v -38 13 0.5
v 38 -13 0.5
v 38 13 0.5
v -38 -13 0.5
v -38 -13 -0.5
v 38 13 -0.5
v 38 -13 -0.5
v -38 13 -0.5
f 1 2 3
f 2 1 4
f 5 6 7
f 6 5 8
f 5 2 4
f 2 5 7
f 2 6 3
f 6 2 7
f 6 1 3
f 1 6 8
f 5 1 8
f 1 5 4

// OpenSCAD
// file: libs/microscope-slide-hyperobject/slide.scad
// ----------------------------------------------------
// Material Hyperobject Compensations
// (Passed dynamically by the Commons API)
// ----------------------------------------------------
mat_shrinkage_x = 1.0;
mat_shrinkage_y = 1.0;
mat_shrinkage_z = 1.0;

mat_clear_press = 0.0;
mat_clear_slide = 0.0;
mat_clear_loose = 0.0;

// Standard Microscope Slide Dimensions (ISO 8037)
function slide_slot_width(thickness, tolerance) = thickness + tolerance + mat_clear_slide + 0.1;
function slide_pitch(slot_w, rib_w) = slot_w + rib_w;

module slide_retention_rib(height, depth, root_w, tip_w, chamfer_h) {
  union() {
    cube([root_w, depth, height - chamfer_h]);
    translate([0, 0, height - chamfer_h])
      polyhedron(
        points=[
          [0, 0, 0],
          [root_w, 0, 0],
          [root_w, depth, 0],
          [0, depth, 0],
          [(root_w - tip_w) / 2, 0, chamfer_h],
          [(root_w + tip_w) / 2, 0, chamfer_h],
          [(root_w + tip_w) / 2, depth, chamfer_h],
          [(root_w - tip_w) / 2, depth, chamfer_h],
        ],
        faces=[
          [0, 1, 2, 3],
          [4, 5, 6, 7],
          [0, 4, 7, 3],
          [1, 5, 6, 2],
          [0, 1, 5, 4],
          [3, 2, 6, 7],
        ]
      );
  }
}

module slide_slot_array(count, pitch, height, depth, root_w, tip_w, chamfer_h, tapered) {
  for (i = [0:count]) {
    translate([i * pitch, 0, 0])
      slide_retention_rib(height, depth, root_w, tip_w, chamfer_h);
  }
}

// ----------------------------------------------------
// ISO 8037-1 Bounded 4D Geometry
// ----------------------------------------------------

module iso_8037_slide(length, width, thickness) {
  // A standard microscope slide volumetric cartridge.
  // Glass usually has polished or ground edges.
  cube([length, width, thickness], center=true);
}

// ----------------------------------------------------
// Cartridge Execution Logic (Triggered by Manifest)
// ----------------------------------------------------

slide_standard = 0; // [0:ISO 8037-1 Primary, 1:ISO 8037-1 Alternate, 2:ISO 8255 #1.5H Cover, 3:ISO 8255 #1 Cover, 4:Custom]
custom_slide_length = 76.0;
custom_slide_width = 26.0;
custom_slide_thickness = 1.0;

render_mode = 0; // [0:main]

if (render_mode == 0) {
  // Material simulation logic for transparency via OpenSCAD nightly alpha
  color([0.8, 0.9, 0.9, 0.4]) {
    // Apply Material Hyperobject Shrinkage Compensation
    scale([mat_shrinkage_x, mat_shrinkage_y, mat_shrinkage_z]) {
      if (slide_standard == 0) {
        // ISO 8037-1 Primary
        iso_8037_slide(76.0, 26.0, 1.0);
      } else if (slide_standard == 1) {
        // ISO 8037-1 Alternate
        iso_8037_slide(75.0, 25.0, 1.0);
      } else if (slide_standard == 2) {
        // ISO 8255 #1.5H Cover Glass
        iso_8037_slide(22.0, 22.0, 0.17);
      } else if (slide_standard == 3) {
        // ISO 8255 #1 Cover Glass
        iso_8037_slide(22.0, 22.0, 0.15);
      } else if (slide_standard == 4) {
        // Custom Geometry
        iso_8037_slide(custom_slide_length, custom_slide_width, custom_slide_thickness);
      }
    }
  }
}
// main file
// ============================================================================
// slide_lib.scad — Shared Geometry Library for Microscope Slide Retention
// ============================================================================
// Reference: docs/RESEARCH.pdf — "Parametric Architectures for Microscope
//            Slide Retention" (ISO 8037 tolerance fields, FDM constraints)
//
// This file is `use`d by all four mode SCAD files (box, tray, staining_rack,
// cabinet_drawer). It provides the common-denominator geometry primitives
// identified in the research analysis.
// ============================================================================

include <libs/microscope-slide-hyperobject/slide.scad>

// ---------------------------------------------------------------------------
// 1. Slide Standard Lookup (RESEARCH §2)
// ---------------------------------------------------------------------------
// Index: 0=ISO, 1=US, 2=Petrographic, 3=Supa Mega
// Each row: [length, width, thickness]
SLIDE_STANDARDS = [
  [76.0, 26.0, 1.0], // ISO 8037 standard
  [76.2, 25.4, 1.0], // US "3x1 inch"
  [46.0, 27.0, 1.2], // Petrographic (geology)
  [75.0, 50.0, 1.0], // Supa Mega (brain/prostate)
];

// Resolve effective slide dimensions from standard index + custom overrides
function resolve_slide(standard, custom_l, custom_w, custom_t) =
  standard < len(SLIDE_STANDARDS) ? SLIDE_STANDARDS[standard]
  : [custom_l, custom_w, custom_t];

// ---------------------------------------------------------------------------
// 2. Density / Pitch Lookup (RESEARCH §5.1.2, Table B)
// ---------------------------------------------------------------------------
// Index: 0=archival, 1=working, 2=staining, 3=mailer
// Each row: [rib_width_mm, description]
DENSITY_RIB_WIDTHS = [1.0, 1.5, 2.0, 3.0];

// Accessor function for use<> compatibility (use<> imports functions, not variables)
function density_rib_width(idx) = DENSITY_RIB_WIDTHS[idx];

// Compute slot width from slide thickness + tolerances + waviness
function slot_width(slide_thick, tol_z) = slide_slot_width(slide_thick, tol_z);

// Compute pitch (center-to-center distance between slides)
function pitch(slot_w, rib_w) = slide_pitch(slot_w, rib_w);

// ---------------------------------------------------------------------------
// 3. Slide Bounding Box (RESEARCH §8.2)
// ---------------------------------------------------------------------------
// Now inherited natively via `slide_bounding_box` from the CDG hyperobject.

// ---------------------------------------------------------------------------
// 4. Retention Rib — Tapered with Chamfered Lead-In (RESEARCH §5.1.1)
// ---------------------------------------------------------------------------
// A single rib separating two slide slots. Tapered profile is wider at the
// base (root) and narrower at the tip for a funnel effect during insertion.
// The top 1-2mm features a 45° chamfer to guide slides in.
//
// Profile (XZ cross-section, extruded along Y):
//
//       ╱tip_w╲       ← chamfer zone (45°)
//      │       │
//      │       │      ← main body
//     ╱         ╲
//    root_width        ← base
//
module retention_rib(height, depth, root_w, tip_w, chamfer_h) {
  slide_retention_rib(height, depth, root_w, tip_w, chamfer_h);
}

// Rectangular rib (simpler, for archival density)
module rectangular_rib(height, depth, width) {
  cube([width, depth, height]);
}

// ---------------------------------------------------------------------------
// 5. Slot Array (RESEARCH §8.2)
// ---------------------------------------------------------------------------
// Linear array of ribs along the X axis at the computed pitch.
// Uses additive (union) approach — cleaner for tapered ribs per RESEARCH §8.2.
module slot_array(count, pitch, height, depth, root_w, tip_w, chamfer_h, tapered) {
  slide_slot_array(count, pitch, height, depth, root_w, tip_w, chamfer_h, tapered);
}

// ---------------------------------------------------------------------------
// 6. Anti-Capillary Floor Ribs (RESEARCH §4.1)
// ---------------------------------------------------------------------------
// Two parallel rails at 25% and 75% of pocket width to break vacuum seal.
// Dimensions: 2.0mm wide, 0.5-1.0mm high per research.
module anti_capillary_ribs(pocket_length, pocket_width, rib_height = 0.5) {
  _rib_w = 2.0;
  _offset_25 = pocket_width * 0.25 - _rib_w / 2;
  _offset_75 = pocket_width * 0.75 - _rib_w / 2;

  // Rail at 25%
  translate([_offset_25, 0, 0])
    cube([_rib_w, pocket_length, rib_height]);

  // Rail at 75%
  translate([_offset_75, 0, 0])
    cube([_rib_w, pocket_length, rib_height]);
}

// ---------------------------------------------------------------------------
// 7. Finger Notch (RESEARCH §4.2)
// ---------------------------------------------------------------------------
// Cylindrical Boolean subtraction for ergonomic slide removal.
// Width 15-22mm per commercial holder research (Abdos, Globe Scientific).
// Depth extends below floor for finger pad access.
module finger_notch(radius, depth) {
  translate([0, 0, -depth / 2])
    cylinder(r=radius, h=depth + 1, $fn=32);
}

// ---------------------------------------------------------------------------
// 8.// Stacking Lip and Groove (RESEARCH §4.4)
// ---------------------------------------------------------------------------
// Perimeter ridge on top + groove on bottom for stable vertical stacking.
// Lip: 3mm high, 45° chamfer per research.
// FIXED: Chamfer limited to leave 1.0mm top width for printability.
module stacking_lip(outer_x, outer_y, lip_h = 3, lip_w = 1.5) {
  _min_top = 1.0;
  _chamfer_sz = max(0, lip_w - _min_top);

  difference() {
    // Outer ridge
    linear_extrude(height=lip_h)
      difference() {
        square([outer_x, outer_y]);
        offset(delta=-lip_w)
          square([outer_x, outer_y]);
      }

    // 45° outer chamfer
    if (_chamfer_sz > 0) {
      translate([0, 0, lip_h])
        rotate([0, 0, 0])
          linear_extrude(
            height=_chamfer_sz, scale=[
              (outer_x + 2 * _chamfer_sz) / outer_x,
              (outer_y + 2 * _chamfer_sz) / outer_y,
            ]
          )
            translate([-_chamfer_sz, -_chamfer_sz])
              square([outer_x + 2 * _chamfer_sz, outer_y + 2 * _chamfer_sz]);
    }
  }
}

// Groove (on bottom of part above) — slightly wider for clearance
module stacking_groove(outer_x, outer_y, groove_h = 3.2, groove_w = 1.7) {
  linear_extrude(height=groove_h)
    difference() {
      square([outer_x, outer_y]);
      offset(delta=-groove_w)
        square([outer_x, outer_y]);
    }
}

// ---------------------------------------------------------------------------
// 9. Label Recess (RESEARCH §8.3)
// ---------------------------------------------------------------------------
// Debossed flat area for handwritten or printed labels.
// Engraved 0.4mm deep per research (embossed interferes with insertion).
// FIXED: Added 45deg chamfer on top edge for AM-friendliness (no 90deg overhang).
module label_recess(width, height, depth = 0.4) {
  union() {
    cube([width, height, depth]);

    // Chamfer on the "top" edge (Y+ axis).
    // 45 deg triangle prism to ensure no 90 deg overhang on the ceiling.
    translate([0, height, 0])
      rotate([0, -90, 0]) // Rotate to align with X width
        rotate([0, 0, -90]) // Align profile
          linear_extrude(height=width)
            polygon([[0, 0], [depth, 0], [0, depth]]);
    // 45 deg triangle
  }
}

// ---------------------------------------------------------------------------
// 10. Snap-Fit Cantilever Latch (RESEARCH §5.3)
// ---------------------------------------------------------------------------
// Flexible arm on lid engages lip on base. For PLA, arm length >= 15mm
// to stay within yield stress limits.
//
// Hook profile (side view):
//    ┌──╮
//    │  │ ← hook
//    │  │
//    │  │ ← arm (flexible)
//    └──┘ ← anchor
//
module snap_latch_arm(arm_length, arm_width, arm_thick, hook_height, hook_depth) {
  // Arm
  cube([arm_width, arm_thick, arm_length]);

  // Hook at end
  translate([0, 0, arm_length])
    cube([arm_width, arm_thick + hook_depth, hook_height]);
}

// The catch (lip on the base that the hook grabs)
// FIXED: Added 45deg chamfer support below the catch.
module snap_latch_catch(width, height, depth) {
  union() {
    cube([width, depth, height]);

    // 45-degree print support below the catch, so the overhang is bridged.
    //
    // The old transform chain was three stacked rotates written by trial and
    // error -- its own comments read "Let's keep it simple", "No width is X."
    // -- and it did not land: the catch came out as TWO disjoint bodies with a
    // bounding box of 11.5 x 11.5 x 6.99 for a catch asked for as
    // width 8 x depth 3.5 x height 2, i.e. the chamfer was thrown clear of the
    // body it was meant to support. Two of those per box_base is where
    // box/box_base's stray bodies came from.
    //
    // Built directly instead: the profile lives in the YZ plane (y outward,
    // z downward from the catch's underside) and is extruded along X for
    // `width`, which is the one axis it has to span uniformly. rotate([0,90,0])
    // maps the extrusion axis onto +X and the profile's (x, y) onto (z, y), so
    // the polygon is written as (z, y) pairs.
    rotate([0, 90, 0])
      linear_extrude(height=width)
        polygon([[0, 0], [0, depth], [depth, depth]]);
    // Triangle in YZ plane
    // (0,0) is top-front?
    // The block is [0,0,0] to [width, depth, height].
    // We want support under [0,0,0]..[width, depth, 0].
    // We want a slope from Y=0, Z=-depth to Y=depth, Z=0?
    // Or from Y=0, Z=0 to Y=depth, Z=-depth?
    // Latch catch is on the side of the box.
    // We want the slope to be printable. The bottom needs to be safe.
    // If we print from Z=0 up.
    // This catch is high up on the box.
    // So we need a slope BELOW it connecting to the wall.
    // If the catch sticks out by `depth` from the wall.
    // We need a chamfer from the wall to the tip of the catch.
    // Wall is at Y=0? Or Y=depth? 
    // In box.scad, we position it.
    // Assuming it sticks out, we need support below.
    // So slope from (Y=0, Z=-depth) to (Y=depth, Z=0).
    // Polygon: [[0, -depth], [depth, 0], [0,0]] ?
    // Let's try:
    // polygon([[0,0], [depth,0], [0, -depth]])
  }

  // Revised implementation:
  // Support prism under the block.
  // Block: X=[0..width], Y=[0..depth], Z=[0..height]
  // Gradient should be along Y (from wall to tip).
  // Printable slope: 45 deg.
  // We need a prism X=[0..width], Y=[0..depth], Z=[-depth..0]
  // Shape: Triangle in YZ plane.
  // Vertices: (0,0), (depth,0), (0,-depth).
  // (0,0) connects to wall/bottom-front of block?
  // (depth,0) is tip of block bottom.
  // (0,-depth) is point on wall 45 deg down.
  // Yes.
  translate([0, 0, 0.01])
    rotate([0, 90, 0]) // Extrude along X+
      linear_extrude(height=width)
        polygon([[0, 0], [depth, 0], [0, depth]]);
}

// ---------------------------------------------------------------------------
// 11. Interlocking Stack Tab (RESEARCH §7.1)
// ---------------------------------------------------------------------------
// Trapezoidal dovetail for cabinet stacking stability.
// Male tab on top, female recess on bottom.
module stack_tab_male(base_w = 15, top_w = 10, height = 4, depth = 8) {
  _offset = (base_w - top_w) / 2;
  linear_extrude(height=depth)
    polygon(
      [
        [0, 0],
        [base_w, 0],
        [base_w - _offset, height],
        [_offset, height],
      ]
    );
}

module stack_tab_female(base_w = 15, top_w = 10, height = 4, depth = 8, tol = 0.4) {
  _bw = base_w + tol;
  _tw = top_w + tol;
  _h = height + tol / 2;
  _offset = (_bw - _tw) / 2;
  linear_extrude(height=depth + tol)
    polygon(
      [
        [0, 0],
        [_bw, 0],
        [_bw - _offset, _h],
        [_offset, _h],
      ]
    );
}

// ---------------------------------------------------------------------------
// 12. Drainage Slope (RESEARCH §6.1)
// ---------------------------------------------------------------------------
// Applies a drainage angle to horizontal surfaces for staining rack runoff.
module drainage_slope(length, width, height, angle) {
  _drop = length * tan(angle);
  polyhedron(
    points=[
      [0, 0, 0],
      [width, 0, 0],
      [width, length, 0],
      [0, length, 0],
      [0, 0, height],
      [width, 0, height],
      [width, length, height - _drop],
      [0, length, height - _drop],
    ],
    faces=[
      [0, 1, 2, 3], // bottom
      [7, 6, 5, 4], // top
      [0, 4, 5, 1], // front
      [2, 6, 7, 3], // back
      [0, 3, 7, 4], // left
      [1, 5, 6, 2], // right
    ]
  );
}
